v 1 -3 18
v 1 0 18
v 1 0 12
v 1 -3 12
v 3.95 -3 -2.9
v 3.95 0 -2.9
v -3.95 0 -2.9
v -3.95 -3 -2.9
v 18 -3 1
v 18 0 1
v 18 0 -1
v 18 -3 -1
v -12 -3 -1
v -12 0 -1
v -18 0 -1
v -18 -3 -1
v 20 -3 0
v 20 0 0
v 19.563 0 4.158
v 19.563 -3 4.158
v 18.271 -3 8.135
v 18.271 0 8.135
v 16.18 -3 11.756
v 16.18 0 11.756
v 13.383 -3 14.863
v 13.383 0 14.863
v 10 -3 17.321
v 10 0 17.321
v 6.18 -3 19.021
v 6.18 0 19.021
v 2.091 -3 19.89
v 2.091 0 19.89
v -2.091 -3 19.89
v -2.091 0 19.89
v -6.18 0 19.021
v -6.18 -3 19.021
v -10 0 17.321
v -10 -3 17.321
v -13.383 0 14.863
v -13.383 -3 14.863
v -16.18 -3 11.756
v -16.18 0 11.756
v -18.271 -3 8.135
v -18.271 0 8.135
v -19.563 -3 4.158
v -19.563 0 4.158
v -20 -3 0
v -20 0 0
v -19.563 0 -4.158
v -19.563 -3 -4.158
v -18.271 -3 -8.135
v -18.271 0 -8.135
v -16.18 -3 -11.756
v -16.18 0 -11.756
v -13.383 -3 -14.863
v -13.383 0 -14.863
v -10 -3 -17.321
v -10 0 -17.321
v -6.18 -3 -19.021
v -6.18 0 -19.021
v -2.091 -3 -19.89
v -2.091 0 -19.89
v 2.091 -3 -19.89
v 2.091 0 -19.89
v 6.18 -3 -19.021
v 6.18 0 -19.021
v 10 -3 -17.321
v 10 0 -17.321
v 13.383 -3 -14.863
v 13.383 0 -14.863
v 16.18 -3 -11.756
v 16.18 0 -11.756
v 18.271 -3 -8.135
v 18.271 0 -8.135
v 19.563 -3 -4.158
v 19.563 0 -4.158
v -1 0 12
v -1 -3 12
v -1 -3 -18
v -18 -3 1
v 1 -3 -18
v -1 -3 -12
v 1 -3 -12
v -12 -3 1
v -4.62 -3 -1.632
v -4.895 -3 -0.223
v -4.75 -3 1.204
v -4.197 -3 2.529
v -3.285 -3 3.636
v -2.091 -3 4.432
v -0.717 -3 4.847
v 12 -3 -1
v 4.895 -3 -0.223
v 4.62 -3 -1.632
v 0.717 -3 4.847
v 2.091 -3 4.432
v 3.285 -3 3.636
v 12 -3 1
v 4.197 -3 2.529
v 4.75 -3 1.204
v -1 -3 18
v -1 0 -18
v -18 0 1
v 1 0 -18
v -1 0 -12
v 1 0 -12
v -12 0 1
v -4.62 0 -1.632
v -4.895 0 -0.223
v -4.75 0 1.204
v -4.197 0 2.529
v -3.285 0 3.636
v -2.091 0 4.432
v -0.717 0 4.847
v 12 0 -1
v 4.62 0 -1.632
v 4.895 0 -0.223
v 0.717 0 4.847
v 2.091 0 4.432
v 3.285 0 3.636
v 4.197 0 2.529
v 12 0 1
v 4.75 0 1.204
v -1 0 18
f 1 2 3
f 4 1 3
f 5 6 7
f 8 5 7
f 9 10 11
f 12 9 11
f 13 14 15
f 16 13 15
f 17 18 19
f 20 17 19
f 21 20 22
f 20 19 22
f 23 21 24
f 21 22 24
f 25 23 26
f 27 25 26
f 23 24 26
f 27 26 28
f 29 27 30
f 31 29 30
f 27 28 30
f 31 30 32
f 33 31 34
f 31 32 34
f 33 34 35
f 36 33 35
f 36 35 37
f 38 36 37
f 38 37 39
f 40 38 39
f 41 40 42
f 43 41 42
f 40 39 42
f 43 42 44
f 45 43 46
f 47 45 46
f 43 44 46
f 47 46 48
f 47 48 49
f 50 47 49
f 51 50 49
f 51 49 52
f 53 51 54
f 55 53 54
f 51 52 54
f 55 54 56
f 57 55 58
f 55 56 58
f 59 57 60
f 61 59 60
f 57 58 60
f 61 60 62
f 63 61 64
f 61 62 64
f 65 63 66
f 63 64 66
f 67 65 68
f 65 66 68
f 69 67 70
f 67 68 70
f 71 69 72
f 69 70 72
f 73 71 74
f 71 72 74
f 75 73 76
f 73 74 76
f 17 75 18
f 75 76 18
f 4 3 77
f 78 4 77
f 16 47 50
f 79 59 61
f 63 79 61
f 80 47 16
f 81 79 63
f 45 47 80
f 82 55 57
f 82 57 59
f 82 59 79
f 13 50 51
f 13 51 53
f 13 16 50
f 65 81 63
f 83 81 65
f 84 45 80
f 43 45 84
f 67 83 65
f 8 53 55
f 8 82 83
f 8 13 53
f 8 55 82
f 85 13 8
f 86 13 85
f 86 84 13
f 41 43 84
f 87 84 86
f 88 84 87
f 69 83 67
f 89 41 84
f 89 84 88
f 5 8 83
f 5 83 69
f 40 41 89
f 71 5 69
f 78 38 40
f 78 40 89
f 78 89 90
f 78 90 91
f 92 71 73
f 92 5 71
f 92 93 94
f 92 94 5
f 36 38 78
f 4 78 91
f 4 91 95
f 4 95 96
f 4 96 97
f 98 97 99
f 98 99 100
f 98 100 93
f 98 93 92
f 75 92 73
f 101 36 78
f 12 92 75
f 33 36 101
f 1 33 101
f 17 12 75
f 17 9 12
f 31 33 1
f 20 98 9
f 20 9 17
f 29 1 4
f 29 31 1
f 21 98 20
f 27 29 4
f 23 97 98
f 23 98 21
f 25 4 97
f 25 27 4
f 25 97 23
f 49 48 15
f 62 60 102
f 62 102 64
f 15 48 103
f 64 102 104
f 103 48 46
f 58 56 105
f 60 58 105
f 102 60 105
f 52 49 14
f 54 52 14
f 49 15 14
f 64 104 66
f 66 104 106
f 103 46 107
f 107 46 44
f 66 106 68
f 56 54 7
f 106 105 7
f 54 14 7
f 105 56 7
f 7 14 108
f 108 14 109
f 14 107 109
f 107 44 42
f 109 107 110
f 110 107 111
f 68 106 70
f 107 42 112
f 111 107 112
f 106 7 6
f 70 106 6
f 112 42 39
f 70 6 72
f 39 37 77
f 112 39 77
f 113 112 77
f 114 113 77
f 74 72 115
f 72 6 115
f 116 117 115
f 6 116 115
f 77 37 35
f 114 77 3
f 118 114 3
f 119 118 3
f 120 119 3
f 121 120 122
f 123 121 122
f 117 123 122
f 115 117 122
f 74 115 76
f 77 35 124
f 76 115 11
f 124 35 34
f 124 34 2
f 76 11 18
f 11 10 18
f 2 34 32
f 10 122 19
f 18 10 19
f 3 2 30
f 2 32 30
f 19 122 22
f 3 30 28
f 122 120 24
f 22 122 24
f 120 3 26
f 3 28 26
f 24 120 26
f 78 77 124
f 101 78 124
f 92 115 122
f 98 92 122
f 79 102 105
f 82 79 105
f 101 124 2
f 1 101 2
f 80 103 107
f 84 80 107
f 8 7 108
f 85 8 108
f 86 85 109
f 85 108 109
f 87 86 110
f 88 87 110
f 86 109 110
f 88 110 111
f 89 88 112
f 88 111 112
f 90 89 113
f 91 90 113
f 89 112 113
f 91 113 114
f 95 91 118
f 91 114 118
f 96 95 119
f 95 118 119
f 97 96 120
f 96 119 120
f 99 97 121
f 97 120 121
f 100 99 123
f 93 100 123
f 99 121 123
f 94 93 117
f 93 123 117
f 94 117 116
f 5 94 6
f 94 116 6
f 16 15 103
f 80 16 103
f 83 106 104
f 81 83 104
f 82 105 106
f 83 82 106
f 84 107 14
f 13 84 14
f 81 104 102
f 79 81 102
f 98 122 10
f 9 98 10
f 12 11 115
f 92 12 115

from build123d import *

# Parameters (mm, degrees)
F0_R     = 20
F1_DEPTH = 3


with BuildPart() as f1:
    # F0 (on Front) → F1 (new body)
    with BuildSketch(Plane.XZ):
        Circle(F0_R)
        Polygon((-1, -12), (0, -12), (1, -12), (1, -18), (-1, -18), align=None, mode=Mode.SUBTRACT)
        Polygon((-12, 1), (-12, 0), (-12, -1), (-18, -1), (-18, 1), align=None, mode=Mode.SUBTRACT)
        with BuildLine():
            ThreePointArc((-3.949684, -2.9), (0, 4.9), (3.949684, -2.9))
            Line((3.949684, -2.9), (-3.949684, -2.9))
        make_face(mode=Mode.SUBTRACT)
        Polygon((12, -1), (12, 0), (12, 1), (18, 1), (18, -1), align=None, mode=Mode.SUBTRACT)
        Polygon((1, 12), (0, 12), (-1, 12), (-1, 18), (1, 18), align=None, mode=Mode.SUBTRACT)
    extrude(amount=F1_DEPTH)


solid = f1.part
